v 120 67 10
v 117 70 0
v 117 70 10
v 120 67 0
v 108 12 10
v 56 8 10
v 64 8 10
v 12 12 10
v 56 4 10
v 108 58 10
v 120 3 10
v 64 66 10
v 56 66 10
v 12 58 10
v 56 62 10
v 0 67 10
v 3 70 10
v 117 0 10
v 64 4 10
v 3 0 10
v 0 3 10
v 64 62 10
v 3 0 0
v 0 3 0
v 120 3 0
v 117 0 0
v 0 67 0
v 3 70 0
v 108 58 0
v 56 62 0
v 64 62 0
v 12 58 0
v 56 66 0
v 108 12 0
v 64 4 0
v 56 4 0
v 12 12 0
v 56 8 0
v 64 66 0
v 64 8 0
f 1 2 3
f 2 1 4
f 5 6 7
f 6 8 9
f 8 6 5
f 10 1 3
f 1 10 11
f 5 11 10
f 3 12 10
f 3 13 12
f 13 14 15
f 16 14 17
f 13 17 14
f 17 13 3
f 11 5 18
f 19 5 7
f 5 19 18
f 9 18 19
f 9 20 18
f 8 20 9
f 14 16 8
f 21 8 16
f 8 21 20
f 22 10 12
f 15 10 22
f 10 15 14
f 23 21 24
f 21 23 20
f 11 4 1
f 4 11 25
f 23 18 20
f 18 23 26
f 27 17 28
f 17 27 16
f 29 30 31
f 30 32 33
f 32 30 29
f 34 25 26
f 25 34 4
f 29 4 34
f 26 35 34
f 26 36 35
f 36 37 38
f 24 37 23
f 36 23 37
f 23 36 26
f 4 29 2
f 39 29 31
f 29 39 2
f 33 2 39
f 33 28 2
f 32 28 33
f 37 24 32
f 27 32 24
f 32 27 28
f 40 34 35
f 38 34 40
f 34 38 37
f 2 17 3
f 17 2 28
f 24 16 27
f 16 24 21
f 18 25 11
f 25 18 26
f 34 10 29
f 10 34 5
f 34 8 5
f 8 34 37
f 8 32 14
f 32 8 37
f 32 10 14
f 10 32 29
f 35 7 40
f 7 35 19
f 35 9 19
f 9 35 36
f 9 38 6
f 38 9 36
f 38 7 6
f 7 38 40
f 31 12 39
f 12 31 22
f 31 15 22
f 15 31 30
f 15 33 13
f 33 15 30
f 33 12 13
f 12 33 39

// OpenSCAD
$fn = 32;

// ----------------------------------------------------------------------
// Frame plate: 120 x 70 frame, 12 mm rails
// ----------------------------------------------------------------------

// --- parameters (mm) ---
plate_l = 120;            // plate length, X
plate_w = 70;             // plate width, Y
plate_t = 10;             // plate thickness, Z (extrusion height)
corner_c = 3;             // corner chamfer
frame_bar = 12;           // frame rail width
slot_l = 8;               // adjustment slot length
slot_w = 4;               // adjustment slot width

win_l = plate_l - 2 * frame_bar;  // window length
win_w = plate_w - 2 * frame_bar;  // window width

profile = [[3, 0], [117, 0], [120, 3], [120, 67], [117, 70], [3, 70], [0, 67], [0, 3]];  // primary outline, 8 points, counter clockwise
void_1 = [[12, 12], [108, 12], [108, 58], [12, 58]];  // the window, 4 points
void_2 = [[56, 4], [64, 4], [64, 8], [56, 8]];  // adjustment slot, 4 points
void_3 = [[56, 62], [64, 62], [64, 66], [56, 66]];  // adjustment slot, 4 points

// --- the one profile operation ---
difference() {
  linear_extrude(height = plate_t) polygon(points = profile);
  translate([0, 0, -1])
    linear_extrude(height = plate_t + 2) polygon(points = void_1);
  translate([0, 0, -1])
    linear_extrude(height = plate_t + 2) polygon(points = void_2);
  translate([0, 0, -1])
    linear_extrude(height = plate_t + 2) polygon(points = void_3);
}
